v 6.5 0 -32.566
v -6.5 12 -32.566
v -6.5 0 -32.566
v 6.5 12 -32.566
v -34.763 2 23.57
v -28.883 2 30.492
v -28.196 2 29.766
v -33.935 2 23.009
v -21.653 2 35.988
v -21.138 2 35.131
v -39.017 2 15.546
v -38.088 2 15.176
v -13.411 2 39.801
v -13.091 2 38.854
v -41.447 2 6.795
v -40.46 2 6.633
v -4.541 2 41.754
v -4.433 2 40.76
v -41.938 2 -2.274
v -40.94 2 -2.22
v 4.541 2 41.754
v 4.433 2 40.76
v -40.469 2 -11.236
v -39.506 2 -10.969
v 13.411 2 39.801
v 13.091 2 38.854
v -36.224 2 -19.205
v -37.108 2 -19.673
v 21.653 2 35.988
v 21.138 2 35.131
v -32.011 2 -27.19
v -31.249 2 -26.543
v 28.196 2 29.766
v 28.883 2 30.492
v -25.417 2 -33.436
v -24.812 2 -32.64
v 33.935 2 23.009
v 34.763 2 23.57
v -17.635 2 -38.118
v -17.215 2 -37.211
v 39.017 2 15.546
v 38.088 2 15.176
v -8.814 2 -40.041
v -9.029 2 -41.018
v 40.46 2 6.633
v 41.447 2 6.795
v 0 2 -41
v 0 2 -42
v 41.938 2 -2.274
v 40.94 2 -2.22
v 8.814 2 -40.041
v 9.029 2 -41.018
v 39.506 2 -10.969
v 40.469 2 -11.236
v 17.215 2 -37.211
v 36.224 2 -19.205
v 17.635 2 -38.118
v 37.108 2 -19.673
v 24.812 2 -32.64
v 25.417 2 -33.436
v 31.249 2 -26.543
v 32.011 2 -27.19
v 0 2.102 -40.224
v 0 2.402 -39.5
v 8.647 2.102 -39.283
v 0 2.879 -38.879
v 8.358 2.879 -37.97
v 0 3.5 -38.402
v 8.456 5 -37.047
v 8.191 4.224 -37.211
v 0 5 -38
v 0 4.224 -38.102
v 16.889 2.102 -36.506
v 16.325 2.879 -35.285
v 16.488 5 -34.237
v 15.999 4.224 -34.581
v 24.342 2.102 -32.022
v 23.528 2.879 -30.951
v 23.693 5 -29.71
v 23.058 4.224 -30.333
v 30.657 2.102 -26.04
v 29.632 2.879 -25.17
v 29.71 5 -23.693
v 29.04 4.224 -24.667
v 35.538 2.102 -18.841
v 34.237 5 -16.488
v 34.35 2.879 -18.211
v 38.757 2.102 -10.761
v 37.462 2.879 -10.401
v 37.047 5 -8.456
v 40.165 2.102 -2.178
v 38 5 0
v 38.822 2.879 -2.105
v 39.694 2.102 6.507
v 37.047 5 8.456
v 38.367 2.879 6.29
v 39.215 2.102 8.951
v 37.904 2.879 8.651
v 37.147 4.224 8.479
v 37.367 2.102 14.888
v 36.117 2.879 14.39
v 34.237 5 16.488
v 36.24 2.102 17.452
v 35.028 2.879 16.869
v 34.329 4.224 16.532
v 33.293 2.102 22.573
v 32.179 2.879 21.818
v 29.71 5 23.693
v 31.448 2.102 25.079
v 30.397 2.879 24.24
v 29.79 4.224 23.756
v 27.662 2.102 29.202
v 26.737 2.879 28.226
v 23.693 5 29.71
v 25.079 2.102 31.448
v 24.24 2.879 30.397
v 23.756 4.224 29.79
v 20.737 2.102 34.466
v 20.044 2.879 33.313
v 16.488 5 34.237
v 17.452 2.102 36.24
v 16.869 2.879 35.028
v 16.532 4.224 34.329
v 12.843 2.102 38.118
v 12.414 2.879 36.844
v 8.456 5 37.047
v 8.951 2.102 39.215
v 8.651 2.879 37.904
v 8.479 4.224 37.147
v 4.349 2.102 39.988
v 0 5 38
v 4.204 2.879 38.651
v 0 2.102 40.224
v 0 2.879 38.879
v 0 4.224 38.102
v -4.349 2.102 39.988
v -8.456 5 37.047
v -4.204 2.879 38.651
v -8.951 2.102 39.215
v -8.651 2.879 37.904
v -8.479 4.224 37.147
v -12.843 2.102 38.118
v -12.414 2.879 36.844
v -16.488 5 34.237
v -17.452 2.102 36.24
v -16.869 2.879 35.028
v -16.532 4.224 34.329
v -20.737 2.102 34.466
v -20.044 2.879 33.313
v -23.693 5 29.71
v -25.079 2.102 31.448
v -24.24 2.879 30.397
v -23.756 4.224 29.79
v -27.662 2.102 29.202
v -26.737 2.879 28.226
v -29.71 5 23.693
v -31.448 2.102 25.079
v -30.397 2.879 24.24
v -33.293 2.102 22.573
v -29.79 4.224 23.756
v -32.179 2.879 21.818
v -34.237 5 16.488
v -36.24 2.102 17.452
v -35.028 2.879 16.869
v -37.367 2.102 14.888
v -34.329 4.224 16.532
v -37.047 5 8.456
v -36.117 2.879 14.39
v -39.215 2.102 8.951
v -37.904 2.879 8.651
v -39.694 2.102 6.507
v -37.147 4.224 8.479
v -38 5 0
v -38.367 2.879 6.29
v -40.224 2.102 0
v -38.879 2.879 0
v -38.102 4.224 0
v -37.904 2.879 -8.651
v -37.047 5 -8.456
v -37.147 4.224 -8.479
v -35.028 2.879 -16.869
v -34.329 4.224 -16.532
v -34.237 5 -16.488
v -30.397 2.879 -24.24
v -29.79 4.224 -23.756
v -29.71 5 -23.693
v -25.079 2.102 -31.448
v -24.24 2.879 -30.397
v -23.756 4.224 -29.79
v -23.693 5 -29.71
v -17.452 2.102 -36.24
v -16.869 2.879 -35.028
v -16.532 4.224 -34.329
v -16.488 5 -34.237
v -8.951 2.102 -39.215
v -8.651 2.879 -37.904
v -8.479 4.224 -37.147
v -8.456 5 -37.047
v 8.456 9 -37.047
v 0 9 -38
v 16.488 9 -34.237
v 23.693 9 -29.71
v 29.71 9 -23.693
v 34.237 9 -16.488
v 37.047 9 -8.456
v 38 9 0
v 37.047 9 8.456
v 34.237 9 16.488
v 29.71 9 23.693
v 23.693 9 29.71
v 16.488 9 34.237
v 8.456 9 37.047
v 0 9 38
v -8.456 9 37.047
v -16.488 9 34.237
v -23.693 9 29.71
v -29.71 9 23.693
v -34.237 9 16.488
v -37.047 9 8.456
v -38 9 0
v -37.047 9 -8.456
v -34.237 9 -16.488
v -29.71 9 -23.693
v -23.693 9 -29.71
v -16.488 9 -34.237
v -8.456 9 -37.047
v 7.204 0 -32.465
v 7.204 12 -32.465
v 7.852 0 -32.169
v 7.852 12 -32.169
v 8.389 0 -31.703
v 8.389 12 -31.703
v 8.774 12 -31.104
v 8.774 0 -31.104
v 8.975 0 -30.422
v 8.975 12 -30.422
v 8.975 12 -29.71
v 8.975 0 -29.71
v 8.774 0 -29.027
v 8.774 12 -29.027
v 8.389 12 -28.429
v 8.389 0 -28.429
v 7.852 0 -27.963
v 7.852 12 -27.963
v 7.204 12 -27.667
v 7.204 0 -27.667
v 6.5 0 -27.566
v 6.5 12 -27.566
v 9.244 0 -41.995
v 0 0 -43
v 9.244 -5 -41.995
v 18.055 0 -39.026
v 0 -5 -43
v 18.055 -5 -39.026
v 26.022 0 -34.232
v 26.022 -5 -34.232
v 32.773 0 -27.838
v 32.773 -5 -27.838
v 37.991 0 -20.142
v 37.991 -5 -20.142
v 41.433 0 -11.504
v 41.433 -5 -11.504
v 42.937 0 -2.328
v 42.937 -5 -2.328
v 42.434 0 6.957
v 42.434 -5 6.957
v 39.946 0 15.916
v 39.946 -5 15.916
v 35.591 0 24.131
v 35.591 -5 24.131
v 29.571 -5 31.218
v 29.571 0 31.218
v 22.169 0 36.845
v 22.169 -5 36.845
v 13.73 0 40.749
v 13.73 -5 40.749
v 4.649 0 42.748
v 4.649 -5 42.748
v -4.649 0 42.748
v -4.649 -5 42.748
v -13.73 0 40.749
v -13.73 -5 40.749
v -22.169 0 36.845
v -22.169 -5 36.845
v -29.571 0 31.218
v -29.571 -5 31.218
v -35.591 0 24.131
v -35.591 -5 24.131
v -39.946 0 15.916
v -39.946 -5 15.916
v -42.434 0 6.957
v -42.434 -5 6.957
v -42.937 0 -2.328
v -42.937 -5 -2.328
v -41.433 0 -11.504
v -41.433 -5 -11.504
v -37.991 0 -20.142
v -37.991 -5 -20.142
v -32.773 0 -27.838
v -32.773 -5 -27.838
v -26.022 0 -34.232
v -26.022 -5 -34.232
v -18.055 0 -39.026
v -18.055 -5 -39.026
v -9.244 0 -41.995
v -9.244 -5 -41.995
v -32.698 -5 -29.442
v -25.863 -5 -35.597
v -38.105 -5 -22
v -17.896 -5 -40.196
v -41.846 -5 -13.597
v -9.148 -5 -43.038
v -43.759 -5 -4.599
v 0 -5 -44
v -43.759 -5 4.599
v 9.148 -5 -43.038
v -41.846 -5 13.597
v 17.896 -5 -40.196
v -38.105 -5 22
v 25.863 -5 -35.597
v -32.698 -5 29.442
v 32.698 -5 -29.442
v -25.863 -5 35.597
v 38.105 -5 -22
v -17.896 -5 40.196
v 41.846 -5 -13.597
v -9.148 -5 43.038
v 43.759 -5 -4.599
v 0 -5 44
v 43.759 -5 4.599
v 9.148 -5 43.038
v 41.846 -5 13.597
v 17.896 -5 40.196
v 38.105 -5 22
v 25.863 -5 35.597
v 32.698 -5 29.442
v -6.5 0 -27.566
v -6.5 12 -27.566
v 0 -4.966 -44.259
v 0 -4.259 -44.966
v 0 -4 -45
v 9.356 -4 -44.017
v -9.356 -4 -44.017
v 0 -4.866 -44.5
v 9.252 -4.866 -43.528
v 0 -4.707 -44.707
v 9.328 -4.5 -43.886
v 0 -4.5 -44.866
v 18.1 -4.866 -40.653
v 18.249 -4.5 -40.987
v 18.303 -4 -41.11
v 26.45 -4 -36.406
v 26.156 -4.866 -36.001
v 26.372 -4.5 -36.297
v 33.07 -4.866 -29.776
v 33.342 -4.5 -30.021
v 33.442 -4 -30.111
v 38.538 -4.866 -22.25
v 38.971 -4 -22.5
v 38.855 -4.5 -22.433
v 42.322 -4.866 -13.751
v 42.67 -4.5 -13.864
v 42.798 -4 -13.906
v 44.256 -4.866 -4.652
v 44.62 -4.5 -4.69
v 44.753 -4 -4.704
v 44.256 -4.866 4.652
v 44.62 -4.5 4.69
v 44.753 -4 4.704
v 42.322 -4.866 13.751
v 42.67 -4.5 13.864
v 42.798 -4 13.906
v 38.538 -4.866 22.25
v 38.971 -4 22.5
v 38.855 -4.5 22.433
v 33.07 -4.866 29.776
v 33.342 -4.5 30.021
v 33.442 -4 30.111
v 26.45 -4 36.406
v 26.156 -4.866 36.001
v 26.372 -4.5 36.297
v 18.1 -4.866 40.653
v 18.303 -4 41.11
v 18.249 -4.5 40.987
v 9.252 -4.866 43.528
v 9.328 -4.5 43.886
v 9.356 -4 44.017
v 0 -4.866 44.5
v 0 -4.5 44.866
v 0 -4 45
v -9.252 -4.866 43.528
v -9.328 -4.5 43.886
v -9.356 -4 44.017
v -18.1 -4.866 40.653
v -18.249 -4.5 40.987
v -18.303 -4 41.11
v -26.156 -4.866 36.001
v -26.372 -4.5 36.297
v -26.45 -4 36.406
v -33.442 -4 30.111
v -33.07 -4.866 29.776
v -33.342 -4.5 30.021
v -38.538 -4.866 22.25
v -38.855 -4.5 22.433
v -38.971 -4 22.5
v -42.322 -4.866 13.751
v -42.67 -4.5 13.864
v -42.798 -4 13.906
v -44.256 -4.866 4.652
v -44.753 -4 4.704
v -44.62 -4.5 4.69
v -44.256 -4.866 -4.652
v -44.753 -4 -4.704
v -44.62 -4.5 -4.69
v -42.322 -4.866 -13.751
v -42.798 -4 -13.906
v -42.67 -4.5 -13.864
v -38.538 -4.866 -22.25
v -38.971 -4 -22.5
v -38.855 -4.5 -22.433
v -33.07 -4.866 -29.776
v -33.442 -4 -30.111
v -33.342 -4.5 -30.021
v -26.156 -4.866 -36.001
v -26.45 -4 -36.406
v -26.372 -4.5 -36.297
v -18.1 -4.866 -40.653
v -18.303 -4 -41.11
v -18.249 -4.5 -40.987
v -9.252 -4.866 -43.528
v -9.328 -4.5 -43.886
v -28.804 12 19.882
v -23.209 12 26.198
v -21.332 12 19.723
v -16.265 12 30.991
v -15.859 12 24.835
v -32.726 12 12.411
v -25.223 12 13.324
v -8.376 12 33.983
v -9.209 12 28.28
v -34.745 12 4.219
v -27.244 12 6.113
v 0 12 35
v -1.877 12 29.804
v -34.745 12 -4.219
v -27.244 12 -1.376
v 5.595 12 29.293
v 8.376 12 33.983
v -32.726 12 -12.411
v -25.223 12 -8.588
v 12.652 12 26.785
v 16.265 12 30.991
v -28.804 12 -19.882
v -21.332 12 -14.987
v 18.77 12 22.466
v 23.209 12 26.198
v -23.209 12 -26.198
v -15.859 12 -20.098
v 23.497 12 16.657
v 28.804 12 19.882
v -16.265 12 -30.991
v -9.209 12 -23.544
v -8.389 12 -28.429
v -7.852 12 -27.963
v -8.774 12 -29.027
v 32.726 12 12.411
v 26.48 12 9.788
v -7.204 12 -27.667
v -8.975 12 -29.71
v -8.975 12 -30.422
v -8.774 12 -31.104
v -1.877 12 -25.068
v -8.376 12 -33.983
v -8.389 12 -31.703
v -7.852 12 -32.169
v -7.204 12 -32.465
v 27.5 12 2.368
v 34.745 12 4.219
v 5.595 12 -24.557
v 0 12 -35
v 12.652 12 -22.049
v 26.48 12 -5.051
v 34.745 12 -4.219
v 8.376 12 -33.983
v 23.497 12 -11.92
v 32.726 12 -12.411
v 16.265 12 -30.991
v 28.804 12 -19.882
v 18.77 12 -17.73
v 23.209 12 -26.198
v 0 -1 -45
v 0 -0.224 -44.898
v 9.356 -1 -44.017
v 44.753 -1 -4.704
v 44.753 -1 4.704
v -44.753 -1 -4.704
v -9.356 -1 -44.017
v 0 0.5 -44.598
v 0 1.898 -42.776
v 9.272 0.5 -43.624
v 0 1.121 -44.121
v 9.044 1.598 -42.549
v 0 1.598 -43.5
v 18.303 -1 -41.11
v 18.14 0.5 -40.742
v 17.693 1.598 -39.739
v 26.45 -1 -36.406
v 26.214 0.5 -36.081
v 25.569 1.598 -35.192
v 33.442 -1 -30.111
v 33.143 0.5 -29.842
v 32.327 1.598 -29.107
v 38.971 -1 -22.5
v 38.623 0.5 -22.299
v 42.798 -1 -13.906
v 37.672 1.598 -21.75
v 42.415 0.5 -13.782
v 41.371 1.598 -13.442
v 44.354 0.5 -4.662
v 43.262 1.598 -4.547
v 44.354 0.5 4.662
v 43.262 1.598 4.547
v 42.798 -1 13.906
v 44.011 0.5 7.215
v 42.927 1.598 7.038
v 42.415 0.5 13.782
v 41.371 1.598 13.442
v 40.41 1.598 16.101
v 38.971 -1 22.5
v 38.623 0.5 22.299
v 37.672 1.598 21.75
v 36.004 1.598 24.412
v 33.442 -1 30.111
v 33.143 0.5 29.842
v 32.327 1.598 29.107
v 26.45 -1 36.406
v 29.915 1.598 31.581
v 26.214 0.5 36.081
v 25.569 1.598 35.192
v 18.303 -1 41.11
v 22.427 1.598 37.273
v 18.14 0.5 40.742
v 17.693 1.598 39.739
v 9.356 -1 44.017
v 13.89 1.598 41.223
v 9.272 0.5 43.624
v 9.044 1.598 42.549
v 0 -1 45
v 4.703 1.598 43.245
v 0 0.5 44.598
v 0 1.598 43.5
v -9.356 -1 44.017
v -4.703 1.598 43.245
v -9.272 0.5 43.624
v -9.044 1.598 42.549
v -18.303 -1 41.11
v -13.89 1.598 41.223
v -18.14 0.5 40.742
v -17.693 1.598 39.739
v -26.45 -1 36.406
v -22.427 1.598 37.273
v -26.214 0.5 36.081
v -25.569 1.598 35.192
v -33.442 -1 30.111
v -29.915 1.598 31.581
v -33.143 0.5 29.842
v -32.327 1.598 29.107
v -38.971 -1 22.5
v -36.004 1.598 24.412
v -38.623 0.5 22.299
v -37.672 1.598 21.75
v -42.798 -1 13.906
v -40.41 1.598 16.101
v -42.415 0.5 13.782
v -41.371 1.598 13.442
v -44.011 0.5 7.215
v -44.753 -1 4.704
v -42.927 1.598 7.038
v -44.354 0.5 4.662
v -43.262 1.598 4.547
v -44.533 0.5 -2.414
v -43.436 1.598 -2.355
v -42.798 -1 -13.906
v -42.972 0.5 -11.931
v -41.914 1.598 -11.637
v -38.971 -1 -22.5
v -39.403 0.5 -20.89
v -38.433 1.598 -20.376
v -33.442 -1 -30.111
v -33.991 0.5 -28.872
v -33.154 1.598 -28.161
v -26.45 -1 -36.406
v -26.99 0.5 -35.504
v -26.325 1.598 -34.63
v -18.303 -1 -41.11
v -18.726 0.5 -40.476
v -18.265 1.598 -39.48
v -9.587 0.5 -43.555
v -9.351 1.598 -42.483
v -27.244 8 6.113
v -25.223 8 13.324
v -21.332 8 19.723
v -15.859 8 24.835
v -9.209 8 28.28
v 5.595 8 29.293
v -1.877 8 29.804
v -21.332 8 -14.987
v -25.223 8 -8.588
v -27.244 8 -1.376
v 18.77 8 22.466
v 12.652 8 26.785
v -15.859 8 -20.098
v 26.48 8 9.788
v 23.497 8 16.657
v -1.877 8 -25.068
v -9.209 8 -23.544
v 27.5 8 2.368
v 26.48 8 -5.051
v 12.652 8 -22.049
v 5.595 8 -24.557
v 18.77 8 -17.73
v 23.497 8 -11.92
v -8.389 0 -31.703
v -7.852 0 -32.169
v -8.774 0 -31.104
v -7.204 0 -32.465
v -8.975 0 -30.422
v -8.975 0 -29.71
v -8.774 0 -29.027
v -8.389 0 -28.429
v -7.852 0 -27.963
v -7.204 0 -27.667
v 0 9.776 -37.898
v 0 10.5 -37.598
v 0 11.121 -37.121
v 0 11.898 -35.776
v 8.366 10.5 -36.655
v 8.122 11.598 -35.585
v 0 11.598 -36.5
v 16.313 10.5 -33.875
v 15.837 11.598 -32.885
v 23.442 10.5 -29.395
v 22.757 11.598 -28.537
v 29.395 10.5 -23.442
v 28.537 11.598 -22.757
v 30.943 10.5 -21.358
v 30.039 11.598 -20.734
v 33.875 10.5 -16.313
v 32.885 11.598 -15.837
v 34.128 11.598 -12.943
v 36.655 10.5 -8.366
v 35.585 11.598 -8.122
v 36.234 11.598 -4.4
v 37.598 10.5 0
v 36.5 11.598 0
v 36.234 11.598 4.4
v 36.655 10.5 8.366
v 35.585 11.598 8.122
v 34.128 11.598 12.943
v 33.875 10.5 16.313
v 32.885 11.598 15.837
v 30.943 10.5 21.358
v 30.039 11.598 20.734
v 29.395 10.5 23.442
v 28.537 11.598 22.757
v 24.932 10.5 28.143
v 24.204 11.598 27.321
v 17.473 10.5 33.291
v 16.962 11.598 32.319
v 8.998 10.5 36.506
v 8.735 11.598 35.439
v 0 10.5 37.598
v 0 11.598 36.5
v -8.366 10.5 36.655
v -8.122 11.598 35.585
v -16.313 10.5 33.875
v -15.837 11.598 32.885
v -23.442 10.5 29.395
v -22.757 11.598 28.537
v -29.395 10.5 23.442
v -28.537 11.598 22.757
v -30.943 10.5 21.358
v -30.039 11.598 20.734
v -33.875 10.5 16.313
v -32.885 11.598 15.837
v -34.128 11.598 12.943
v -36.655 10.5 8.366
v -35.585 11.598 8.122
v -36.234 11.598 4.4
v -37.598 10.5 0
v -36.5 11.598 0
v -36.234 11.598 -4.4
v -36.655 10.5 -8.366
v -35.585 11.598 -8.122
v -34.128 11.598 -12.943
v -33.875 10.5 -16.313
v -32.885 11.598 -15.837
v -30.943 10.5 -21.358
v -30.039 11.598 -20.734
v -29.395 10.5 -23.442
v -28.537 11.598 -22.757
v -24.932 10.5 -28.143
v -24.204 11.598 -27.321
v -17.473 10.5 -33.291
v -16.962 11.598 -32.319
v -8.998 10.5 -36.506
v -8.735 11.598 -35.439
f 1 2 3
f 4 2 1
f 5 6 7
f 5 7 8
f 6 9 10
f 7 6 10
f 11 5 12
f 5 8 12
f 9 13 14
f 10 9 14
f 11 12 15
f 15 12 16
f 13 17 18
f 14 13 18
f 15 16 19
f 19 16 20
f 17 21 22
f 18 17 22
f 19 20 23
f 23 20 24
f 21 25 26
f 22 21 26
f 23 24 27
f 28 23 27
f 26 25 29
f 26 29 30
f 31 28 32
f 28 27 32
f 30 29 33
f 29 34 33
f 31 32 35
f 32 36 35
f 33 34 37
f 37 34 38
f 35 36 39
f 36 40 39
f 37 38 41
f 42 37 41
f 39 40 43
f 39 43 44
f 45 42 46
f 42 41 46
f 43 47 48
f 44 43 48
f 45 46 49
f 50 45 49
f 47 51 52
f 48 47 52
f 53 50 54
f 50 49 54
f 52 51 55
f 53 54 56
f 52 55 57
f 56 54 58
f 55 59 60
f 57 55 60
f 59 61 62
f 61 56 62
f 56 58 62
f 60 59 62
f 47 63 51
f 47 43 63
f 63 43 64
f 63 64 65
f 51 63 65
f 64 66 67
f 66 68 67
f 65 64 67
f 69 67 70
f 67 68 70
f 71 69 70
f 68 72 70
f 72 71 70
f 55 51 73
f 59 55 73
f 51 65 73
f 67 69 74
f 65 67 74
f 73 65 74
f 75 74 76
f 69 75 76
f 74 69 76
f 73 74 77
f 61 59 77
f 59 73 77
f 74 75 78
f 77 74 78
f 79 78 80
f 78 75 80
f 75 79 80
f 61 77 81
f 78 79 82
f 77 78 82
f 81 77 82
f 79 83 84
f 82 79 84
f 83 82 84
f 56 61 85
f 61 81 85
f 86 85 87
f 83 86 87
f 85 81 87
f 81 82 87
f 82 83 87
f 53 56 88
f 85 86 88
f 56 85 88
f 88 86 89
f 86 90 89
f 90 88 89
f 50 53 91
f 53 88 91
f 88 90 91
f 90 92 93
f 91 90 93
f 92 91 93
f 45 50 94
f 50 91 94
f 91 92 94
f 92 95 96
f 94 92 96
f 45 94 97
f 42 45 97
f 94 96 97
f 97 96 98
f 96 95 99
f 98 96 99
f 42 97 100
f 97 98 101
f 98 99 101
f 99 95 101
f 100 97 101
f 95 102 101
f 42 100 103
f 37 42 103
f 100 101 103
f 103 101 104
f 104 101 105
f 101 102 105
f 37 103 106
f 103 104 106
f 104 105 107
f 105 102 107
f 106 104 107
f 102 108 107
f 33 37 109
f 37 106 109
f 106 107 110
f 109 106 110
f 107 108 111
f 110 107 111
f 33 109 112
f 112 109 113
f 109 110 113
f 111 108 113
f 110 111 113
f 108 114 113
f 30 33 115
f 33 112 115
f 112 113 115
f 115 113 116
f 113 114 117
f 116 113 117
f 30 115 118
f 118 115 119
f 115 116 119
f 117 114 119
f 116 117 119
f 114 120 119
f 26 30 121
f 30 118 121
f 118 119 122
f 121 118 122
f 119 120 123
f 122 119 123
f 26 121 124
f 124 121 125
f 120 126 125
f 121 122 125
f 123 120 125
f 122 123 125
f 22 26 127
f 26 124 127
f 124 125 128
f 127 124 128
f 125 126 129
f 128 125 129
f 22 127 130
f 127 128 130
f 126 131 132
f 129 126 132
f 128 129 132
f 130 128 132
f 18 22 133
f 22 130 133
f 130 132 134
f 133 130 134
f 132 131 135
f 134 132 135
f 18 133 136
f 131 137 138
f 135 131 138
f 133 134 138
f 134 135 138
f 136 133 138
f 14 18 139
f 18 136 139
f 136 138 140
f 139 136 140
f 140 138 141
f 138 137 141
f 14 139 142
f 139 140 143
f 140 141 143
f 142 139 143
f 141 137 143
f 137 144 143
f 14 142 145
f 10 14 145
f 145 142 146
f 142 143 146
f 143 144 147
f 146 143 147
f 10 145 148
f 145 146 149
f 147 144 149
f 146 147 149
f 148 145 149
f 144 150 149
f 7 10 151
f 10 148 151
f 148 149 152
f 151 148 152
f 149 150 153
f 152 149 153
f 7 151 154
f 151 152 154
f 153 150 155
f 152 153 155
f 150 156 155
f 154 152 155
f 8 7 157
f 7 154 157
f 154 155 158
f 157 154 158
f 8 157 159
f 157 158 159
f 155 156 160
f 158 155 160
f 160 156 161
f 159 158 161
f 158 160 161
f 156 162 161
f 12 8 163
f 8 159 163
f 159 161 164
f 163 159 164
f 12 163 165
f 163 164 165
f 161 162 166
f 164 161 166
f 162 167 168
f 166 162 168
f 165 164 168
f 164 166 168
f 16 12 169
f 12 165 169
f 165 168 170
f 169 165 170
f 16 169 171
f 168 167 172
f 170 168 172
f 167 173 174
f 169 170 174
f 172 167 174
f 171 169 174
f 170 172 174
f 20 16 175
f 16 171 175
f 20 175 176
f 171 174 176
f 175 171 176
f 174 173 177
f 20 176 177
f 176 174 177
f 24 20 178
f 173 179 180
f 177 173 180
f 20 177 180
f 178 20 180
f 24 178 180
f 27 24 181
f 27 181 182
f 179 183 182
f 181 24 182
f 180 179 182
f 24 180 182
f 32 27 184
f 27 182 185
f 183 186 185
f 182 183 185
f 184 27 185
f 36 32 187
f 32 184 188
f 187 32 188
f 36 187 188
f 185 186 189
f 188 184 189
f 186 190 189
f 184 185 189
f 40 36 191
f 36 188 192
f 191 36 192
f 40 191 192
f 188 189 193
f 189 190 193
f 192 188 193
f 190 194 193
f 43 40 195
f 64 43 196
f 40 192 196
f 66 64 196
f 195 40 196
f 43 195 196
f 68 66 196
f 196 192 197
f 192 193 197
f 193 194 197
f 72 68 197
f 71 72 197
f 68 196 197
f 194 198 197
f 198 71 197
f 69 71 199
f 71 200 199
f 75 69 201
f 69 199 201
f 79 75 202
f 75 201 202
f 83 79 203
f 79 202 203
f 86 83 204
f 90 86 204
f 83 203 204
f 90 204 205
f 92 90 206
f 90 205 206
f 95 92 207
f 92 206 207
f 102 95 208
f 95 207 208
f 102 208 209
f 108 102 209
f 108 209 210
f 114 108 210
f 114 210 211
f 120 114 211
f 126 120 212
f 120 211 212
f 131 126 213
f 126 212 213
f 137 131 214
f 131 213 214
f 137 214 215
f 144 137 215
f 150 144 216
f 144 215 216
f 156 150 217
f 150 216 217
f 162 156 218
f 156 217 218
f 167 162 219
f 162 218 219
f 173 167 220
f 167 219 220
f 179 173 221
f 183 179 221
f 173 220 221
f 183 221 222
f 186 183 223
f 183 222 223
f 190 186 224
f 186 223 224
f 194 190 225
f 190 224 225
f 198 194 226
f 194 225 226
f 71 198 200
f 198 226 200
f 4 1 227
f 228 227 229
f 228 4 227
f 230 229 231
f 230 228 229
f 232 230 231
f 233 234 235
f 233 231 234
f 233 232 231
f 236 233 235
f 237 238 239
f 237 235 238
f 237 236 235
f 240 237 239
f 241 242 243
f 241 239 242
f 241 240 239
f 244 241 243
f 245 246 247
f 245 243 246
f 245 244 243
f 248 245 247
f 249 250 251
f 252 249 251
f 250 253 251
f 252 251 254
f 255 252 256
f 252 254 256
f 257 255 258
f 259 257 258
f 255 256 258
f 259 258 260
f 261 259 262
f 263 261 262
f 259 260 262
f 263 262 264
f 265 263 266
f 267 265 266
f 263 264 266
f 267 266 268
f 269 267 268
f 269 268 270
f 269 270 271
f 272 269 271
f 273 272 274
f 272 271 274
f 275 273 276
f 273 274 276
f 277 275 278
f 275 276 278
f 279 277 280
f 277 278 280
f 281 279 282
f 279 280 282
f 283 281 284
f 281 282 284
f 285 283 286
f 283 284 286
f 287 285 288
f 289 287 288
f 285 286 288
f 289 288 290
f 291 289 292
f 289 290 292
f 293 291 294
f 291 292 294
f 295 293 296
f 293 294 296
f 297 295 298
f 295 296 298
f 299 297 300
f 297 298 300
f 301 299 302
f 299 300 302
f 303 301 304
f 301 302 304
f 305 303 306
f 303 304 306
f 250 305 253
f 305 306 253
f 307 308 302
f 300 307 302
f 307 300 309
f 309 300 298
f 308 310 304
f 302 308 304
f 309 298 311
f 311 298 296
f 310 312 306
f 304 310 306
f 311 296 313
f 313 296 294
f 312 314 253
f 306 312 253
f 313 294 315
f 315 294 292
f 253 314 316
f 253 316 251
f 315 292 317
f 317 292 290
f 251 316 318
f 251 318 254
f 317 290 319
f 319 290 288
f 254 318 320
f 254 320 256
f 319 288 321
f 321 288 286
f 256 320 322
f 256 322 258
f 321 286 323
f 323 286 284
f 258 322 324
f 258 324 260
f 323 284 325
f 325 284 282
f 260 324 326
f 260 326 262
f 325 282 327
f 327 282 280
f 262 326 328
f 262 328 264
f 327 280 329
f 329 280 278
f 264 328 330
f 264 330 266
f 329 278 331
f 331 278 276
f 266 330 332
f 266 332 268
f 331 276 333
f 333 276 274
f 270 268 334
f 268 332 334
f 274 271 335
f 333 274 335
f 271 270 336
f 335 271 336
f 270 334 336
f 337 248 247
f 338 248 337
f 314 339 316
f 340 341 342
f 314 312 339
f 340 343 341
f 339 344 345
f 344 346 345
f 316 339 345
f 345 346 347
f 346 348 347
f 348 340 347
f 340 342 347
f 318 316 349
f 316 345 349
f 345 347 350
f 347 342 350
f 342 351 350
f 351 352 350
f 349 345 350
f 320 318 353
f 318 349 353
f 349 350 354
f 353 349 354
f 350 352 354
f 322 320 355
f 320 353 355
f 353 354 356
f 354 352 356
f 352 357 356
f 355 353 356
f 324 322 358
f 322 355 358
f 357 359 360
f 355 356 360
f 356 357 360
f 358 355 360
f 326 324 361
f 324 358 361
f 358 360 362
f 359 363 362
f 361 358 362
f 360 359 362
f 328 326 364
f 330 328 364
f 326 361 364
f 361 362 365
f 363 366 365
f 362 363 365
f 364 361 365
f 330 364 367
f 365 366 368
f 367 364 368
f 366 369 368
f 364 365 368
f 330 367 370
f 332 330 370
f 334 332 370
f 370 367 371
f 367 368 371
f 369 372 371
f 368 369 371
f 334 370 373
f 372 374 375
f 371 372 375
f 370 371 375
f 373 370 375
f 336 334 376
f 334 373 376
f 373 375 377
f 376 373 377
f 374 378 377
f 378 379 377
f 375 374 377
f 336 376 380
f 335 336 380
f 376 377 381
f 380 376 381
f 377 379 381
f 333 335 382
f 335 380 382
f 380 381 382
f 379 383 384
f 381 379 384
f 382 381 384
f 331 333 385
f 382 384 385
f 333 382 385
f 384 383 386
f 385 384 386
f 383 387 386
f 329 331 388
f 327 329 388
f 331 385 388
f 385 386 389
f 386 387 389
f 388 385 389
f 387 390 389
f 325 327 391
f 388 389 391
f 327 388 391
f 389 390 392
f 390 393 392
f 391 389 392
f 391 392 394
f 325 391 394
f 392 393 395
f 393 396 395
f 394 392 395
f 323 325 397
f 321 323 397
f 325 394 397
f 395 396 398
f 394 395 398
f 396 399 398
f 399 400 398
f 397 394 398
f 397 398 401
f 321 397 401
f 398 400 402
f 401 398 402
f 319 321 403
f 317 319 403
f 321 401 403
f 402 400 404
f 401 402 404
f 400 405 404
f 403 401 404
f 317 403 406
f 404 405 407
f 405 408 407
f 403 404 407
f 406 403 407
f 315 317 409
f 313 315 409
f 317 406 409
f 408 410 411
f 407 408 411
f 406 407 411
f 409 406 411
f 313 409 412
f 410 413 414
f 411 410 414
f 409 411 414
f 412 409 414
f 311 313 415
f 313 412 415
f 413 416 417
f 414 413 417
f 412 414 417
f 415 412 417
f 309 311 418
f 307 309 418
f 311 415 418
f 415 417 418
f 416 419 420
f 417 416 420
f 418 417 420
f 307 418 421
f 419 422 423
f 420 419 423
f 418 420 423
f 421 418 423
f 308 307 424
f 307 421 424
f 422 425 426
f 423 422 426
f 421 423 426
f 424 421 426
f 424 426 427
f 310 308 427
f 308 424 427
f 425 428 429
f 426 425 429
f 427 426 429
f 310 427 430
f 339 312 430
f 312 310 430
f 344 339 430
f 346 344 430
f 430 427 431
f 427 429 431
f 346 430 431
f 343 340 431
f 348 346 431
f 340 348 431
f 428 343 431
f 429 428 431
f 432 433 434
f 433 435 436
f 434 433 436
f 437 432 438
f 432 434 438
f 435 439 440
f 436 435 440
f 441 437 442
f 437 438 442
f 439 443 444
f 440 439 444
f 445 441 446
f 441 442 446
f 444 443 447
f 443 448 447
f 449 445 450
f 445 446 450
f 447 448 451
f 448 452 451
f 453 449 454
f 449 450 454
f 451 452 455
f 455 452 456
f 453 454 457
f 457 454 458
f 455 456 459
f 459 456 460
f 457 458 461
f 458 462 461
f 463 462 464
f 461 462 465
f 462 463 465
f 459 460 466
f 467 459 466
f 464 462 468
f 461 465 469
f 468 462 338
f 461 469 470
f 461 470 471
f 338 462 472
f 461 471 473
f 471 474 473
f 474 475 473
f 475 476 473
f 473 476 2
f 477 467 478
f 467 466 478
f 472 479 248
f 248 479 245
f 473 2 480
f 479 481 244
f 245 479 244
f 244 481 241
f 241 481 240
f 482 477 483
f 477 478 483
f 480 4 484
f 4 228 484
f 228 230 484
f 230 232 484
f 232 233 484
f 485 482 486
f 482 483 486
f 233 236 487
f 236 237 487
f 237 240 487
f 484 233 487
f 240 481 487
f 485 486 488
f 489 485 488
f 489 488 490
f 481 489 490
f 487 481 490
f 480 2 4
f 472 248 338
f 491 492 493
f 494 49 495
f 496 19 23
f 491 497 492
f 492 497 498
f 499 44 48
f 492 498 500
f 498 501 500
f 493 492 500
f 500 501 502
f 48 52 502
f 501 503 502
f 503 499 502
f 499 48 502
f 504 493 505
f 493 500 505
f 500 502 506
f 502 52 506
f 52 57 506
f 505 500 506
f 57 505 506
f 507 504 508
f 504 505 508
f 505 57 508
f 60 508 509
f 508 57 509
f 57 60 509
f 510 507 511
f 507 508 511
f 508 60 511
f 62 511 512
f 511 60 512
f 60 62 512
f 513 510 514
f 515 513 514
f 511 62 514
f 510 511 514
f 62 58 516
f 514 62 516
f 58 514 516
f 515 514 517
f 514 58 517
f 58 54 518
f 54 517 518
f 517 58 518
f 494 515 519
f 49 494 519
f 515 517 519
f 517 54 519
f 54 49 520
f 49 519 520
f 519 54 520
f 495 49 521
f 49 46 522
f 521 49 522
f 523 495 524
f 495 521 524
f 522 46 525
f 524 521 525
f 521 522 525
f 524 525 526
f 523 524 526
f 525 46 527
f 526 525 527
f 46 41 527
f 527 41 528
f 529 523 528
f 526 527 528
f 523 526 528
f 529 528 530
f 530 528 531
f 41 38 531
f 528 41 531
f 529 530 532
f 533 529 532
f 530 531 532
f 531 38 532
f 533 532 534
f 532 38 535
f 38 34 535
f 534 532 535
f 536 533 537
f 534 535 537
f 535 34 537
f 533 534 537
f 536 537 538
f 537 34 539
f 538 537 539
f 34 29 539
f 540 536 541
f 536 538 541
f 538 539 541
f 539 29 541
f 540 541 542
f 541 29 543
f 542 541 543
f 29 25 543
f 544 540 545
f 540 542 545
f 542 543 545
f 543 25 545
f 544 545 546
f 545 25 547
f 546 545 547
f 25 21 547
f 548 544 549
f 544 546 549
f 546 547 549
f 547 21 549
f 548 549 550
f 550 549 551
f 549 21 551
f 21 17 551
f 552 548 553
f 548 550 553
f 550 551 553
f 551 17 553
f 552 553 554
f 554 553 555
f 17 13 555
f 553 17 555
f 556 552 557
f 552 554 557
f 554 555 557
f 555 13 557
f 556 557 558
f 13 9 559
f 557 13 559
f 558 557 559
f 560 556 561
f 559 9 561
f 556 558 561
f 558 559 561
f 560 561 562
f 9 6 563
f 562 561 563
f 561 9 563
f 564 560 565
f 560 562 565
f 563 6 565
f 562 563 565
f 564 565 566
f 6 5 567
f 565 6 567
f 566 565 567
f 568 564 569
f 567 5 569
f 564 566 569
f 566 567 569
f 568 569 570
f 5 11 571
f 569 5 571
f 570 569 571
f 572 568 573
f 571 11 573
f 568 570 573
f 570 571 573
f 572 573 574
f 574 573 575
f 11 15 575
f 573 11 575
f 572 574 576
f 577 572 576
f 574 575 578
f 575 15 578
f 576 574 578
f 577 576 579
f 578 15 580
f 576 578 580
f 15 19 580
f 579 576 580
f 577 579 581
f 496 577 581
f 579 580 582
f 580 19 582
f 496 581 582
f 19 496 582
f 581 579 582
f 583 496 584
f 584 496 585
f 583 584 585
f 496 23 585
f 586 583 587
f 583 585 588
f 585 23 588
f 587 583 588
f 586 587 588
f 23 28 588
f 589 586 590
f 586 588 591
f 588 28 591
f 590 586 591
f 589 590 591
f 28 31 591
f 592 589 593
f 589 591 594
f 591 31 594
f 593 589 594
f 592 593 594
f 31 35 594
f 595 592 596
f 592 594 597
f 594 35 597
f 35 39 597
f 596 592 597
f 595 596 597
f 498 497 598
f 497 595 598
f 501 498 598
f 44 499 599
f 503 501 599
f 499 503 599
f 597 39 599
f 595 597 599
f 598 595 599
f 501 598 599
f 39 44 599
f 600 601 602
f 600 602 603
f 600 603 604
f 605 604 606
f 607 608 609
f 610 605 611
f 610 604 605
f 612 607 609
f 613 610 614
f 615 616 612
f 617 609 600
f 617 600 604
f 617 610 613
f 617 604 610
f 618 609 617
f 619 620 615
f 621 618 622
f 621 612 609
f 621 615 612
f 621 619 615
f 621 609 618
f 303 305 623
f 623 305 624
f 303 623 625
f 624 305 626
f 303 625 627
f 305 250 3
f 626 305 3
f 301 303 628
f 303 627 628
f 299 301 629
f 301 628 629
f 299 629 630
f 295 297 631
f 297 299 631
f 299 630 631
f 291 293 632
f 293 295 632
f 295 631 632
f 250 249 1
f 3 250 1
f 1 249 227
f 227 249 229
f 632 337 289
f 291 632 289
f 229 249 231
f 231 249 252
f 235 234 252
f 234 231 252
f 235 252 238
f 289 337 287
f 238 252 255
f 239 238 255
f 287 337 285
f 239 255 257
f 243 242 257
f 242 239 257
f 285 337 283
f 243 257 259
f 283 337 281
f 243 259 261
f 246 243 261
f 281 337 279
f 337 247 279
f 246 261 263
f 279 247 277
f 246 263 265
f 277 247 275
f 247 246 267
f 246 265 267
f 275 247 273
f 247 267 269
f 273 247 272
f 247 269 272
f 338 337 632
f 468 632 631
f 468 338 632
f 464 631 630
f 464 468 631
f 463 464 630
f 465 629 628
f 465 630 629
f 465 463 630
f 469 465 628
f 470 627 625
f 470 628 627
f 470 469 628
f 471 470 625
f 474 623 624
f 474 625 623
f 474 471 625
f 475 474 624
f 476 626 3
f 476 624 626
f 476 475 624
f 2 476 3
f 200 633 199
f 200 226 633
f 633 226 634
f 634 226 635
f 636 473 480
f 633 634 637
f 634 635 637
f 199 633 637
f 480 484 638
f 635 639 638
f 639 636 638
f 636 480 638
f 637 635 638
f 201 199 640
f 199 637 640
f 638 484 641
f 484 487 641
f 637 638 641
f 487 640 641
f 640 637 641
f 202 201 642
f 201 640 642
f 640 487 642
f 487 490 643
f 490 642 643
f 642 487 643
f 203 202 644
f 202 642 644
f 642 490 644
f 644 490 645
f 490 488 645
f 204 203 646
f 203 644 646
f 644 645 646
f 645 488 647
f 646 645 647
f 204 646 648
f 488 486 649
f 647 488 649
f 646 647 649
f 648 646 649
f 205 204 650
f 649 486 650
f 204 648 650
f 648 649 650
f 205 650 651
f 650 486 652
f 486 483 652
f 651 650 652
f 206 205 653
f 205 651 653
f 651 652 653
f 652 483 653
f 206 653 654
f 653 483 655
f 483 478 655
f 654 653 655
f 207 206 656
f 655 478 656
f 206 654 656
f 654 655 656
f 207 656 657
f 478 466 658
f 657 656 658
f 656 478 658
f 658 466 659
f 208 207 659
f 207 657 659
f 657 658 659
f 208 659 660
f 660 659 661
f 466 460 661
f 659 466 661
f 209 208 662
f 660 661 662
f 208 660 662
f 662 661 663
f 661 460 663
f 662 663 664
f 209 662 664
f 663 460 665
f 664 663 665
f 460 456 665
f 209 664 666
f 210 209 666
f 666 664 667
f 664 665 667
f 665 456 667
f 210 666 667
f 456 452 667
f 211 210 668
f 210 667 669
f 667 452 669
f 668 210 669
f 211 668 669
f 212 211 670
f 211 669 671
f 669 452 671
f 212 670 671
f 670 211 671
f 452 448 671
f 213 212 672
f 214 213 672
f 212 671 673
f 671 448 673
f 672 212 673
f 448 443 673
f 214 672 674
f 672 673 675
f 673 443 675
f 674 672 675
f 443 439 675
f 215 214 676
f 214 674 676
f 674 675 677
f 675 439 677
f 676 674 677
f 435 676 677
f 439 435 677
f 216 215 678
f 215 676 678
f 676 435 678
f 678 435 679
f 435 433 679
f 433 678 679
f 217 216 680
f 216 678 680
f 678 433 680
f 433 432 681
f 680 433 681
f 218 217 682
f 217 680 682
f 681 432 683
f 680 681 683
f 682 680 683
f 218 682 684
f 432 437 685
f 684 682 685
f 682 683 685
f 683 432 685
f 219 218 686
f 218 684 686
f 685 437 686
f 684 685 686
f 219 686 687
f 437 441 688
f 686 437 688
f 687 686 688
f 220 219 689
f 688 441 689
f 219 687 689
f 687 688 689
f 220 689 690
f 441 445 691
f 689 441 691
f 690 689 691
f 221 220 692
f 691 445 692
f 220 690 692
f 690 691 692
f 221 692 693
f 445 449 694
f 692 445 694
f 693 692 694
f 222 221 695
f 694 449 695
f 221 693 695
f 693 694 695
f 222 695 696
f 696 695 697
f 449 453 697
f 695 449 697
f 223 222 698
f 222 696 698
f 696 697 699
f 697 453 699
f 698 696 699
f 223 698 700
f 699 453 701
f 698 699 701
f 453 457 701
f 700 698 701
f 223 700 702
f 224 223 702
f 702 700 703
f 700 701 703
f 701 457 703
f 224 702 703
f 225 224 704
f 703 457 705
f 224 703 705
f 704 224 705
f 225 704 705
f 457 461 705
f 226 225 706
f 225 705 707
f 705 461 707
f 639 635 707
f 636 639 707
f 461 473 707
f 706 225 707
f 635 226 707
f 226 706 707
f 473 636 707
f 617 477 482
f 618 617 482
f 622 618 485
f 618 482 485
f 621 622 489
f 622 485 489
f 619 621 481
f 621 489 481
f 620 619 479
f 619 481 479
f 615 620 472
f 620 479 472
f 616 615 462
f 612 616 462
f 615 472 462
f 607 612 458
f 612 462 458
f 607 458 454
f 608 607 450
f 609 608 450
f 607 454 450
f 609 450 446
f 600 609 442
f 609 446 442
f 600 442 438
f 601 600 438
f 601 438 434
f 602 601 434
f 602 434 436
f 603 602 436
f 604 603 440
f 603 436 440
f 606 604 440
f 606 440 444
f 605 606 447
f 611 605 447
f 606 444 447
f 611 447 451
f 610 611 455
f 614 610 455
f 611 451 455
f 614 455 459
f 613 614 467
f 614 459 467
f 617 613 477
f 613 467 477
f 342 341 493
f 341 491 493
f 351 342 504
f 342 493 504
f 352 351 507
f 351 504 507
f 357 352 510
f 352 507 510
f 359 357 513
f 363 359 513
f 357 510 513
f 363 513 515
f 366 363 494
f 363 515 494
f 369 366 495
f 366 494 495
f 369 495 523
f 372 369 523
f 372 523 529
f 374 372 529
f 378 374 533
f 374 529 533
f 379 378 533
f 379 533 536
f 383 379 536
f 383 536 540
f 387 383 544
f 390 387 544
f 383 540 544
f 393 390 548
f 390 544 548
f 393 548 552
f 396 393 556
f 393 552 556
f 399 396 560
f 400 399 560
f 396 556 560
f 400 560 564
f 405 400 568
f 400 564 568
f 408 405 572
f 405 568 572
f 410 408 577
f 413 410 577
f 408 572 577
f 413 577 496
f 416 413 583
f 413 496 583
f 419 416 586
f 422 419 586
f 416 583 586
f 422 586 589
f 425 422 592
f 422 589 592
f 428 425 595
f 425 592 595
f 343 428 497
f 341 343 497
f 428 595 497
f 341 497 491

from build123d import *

# Parameters (mm, degrees)
SKETCH2_R          = 27.5
CUT_EXTRUDE1_DEPTH = 4
CUT_EXTRUDE2_DEPTH = 28


with BuildPart() as part:
    # Sketch1 → Revolve1 (revolve)
    with BuildSketch(Plane(origin=(0, 0, 0), x_dir=(0, 0, -1), z_dir=(1, 0, 0))):
        with BuildLine():
            Line((0, 0), (43, 0))
            Line((43, 0), (43, -5))
            Line((43, -5), (44, -5))
            ThreePointArc((44, -5), (44.707106781, -4.707106781), (45, -4))
            Line((45, -4), (45, -1))
            ThreePointArc((45, -1), (44.121320344, 1.121320344), (42, 2))
            Line((42, 2), (41, 2))
            ThreePointArc((41, 2), (38.878679656, 2.878679656), (38, 5))
            Line((38, 5), (38, 9))
            ThreePointArc((38, 9), (37.121320344, 11.121320344), (35, 12))
            Line((35, 12), (0, 12))
            Line((0, 12), (0, 0))
        make_face()
    revolve(axis=Axis((0, 12, 0), (0, -1, 0)))

    # Sketch2 → Cut-Extrude1 (cut)
    with BuildSketch(Plane(origin=(0, 12, 0), x_dir=(1, 0, 0), z_dir=(0, 1, 0))):
        with Locations((0, -2.368290616)):
            Circle(SKETCH2_R)
    extrude(amount=-CUT_EXTRUDE1_DEPTH, mode=Mode.SUBTRACT)

    # Sketch3 → Cut-Extrude2 (cut)
    with BuildSketch(Plane(origin=(0, 12, 0), x_dir=(1, 0, 0), z_dir=(0, 1, 0))):
        with BuildLine():
            Line((-6.5, 32.565854692), (6.5, 32.565854692))
            ThreePointArc((6.5, 32.565854692), (9, 30.065854692), (6.5, 27.565854692))
            Line((6.5, 27.565854692), (-6.5, 27.565854692))
            ThreePointArc((-6.5, 27.565854692), (-9, 30.065854692), (-6.5, 32.565854692))
        make_face()
    extrude(amount=-CUT_EXTRUDE2_DEPTH, mode=Mode.SUBTRACT)


solid = part.part
